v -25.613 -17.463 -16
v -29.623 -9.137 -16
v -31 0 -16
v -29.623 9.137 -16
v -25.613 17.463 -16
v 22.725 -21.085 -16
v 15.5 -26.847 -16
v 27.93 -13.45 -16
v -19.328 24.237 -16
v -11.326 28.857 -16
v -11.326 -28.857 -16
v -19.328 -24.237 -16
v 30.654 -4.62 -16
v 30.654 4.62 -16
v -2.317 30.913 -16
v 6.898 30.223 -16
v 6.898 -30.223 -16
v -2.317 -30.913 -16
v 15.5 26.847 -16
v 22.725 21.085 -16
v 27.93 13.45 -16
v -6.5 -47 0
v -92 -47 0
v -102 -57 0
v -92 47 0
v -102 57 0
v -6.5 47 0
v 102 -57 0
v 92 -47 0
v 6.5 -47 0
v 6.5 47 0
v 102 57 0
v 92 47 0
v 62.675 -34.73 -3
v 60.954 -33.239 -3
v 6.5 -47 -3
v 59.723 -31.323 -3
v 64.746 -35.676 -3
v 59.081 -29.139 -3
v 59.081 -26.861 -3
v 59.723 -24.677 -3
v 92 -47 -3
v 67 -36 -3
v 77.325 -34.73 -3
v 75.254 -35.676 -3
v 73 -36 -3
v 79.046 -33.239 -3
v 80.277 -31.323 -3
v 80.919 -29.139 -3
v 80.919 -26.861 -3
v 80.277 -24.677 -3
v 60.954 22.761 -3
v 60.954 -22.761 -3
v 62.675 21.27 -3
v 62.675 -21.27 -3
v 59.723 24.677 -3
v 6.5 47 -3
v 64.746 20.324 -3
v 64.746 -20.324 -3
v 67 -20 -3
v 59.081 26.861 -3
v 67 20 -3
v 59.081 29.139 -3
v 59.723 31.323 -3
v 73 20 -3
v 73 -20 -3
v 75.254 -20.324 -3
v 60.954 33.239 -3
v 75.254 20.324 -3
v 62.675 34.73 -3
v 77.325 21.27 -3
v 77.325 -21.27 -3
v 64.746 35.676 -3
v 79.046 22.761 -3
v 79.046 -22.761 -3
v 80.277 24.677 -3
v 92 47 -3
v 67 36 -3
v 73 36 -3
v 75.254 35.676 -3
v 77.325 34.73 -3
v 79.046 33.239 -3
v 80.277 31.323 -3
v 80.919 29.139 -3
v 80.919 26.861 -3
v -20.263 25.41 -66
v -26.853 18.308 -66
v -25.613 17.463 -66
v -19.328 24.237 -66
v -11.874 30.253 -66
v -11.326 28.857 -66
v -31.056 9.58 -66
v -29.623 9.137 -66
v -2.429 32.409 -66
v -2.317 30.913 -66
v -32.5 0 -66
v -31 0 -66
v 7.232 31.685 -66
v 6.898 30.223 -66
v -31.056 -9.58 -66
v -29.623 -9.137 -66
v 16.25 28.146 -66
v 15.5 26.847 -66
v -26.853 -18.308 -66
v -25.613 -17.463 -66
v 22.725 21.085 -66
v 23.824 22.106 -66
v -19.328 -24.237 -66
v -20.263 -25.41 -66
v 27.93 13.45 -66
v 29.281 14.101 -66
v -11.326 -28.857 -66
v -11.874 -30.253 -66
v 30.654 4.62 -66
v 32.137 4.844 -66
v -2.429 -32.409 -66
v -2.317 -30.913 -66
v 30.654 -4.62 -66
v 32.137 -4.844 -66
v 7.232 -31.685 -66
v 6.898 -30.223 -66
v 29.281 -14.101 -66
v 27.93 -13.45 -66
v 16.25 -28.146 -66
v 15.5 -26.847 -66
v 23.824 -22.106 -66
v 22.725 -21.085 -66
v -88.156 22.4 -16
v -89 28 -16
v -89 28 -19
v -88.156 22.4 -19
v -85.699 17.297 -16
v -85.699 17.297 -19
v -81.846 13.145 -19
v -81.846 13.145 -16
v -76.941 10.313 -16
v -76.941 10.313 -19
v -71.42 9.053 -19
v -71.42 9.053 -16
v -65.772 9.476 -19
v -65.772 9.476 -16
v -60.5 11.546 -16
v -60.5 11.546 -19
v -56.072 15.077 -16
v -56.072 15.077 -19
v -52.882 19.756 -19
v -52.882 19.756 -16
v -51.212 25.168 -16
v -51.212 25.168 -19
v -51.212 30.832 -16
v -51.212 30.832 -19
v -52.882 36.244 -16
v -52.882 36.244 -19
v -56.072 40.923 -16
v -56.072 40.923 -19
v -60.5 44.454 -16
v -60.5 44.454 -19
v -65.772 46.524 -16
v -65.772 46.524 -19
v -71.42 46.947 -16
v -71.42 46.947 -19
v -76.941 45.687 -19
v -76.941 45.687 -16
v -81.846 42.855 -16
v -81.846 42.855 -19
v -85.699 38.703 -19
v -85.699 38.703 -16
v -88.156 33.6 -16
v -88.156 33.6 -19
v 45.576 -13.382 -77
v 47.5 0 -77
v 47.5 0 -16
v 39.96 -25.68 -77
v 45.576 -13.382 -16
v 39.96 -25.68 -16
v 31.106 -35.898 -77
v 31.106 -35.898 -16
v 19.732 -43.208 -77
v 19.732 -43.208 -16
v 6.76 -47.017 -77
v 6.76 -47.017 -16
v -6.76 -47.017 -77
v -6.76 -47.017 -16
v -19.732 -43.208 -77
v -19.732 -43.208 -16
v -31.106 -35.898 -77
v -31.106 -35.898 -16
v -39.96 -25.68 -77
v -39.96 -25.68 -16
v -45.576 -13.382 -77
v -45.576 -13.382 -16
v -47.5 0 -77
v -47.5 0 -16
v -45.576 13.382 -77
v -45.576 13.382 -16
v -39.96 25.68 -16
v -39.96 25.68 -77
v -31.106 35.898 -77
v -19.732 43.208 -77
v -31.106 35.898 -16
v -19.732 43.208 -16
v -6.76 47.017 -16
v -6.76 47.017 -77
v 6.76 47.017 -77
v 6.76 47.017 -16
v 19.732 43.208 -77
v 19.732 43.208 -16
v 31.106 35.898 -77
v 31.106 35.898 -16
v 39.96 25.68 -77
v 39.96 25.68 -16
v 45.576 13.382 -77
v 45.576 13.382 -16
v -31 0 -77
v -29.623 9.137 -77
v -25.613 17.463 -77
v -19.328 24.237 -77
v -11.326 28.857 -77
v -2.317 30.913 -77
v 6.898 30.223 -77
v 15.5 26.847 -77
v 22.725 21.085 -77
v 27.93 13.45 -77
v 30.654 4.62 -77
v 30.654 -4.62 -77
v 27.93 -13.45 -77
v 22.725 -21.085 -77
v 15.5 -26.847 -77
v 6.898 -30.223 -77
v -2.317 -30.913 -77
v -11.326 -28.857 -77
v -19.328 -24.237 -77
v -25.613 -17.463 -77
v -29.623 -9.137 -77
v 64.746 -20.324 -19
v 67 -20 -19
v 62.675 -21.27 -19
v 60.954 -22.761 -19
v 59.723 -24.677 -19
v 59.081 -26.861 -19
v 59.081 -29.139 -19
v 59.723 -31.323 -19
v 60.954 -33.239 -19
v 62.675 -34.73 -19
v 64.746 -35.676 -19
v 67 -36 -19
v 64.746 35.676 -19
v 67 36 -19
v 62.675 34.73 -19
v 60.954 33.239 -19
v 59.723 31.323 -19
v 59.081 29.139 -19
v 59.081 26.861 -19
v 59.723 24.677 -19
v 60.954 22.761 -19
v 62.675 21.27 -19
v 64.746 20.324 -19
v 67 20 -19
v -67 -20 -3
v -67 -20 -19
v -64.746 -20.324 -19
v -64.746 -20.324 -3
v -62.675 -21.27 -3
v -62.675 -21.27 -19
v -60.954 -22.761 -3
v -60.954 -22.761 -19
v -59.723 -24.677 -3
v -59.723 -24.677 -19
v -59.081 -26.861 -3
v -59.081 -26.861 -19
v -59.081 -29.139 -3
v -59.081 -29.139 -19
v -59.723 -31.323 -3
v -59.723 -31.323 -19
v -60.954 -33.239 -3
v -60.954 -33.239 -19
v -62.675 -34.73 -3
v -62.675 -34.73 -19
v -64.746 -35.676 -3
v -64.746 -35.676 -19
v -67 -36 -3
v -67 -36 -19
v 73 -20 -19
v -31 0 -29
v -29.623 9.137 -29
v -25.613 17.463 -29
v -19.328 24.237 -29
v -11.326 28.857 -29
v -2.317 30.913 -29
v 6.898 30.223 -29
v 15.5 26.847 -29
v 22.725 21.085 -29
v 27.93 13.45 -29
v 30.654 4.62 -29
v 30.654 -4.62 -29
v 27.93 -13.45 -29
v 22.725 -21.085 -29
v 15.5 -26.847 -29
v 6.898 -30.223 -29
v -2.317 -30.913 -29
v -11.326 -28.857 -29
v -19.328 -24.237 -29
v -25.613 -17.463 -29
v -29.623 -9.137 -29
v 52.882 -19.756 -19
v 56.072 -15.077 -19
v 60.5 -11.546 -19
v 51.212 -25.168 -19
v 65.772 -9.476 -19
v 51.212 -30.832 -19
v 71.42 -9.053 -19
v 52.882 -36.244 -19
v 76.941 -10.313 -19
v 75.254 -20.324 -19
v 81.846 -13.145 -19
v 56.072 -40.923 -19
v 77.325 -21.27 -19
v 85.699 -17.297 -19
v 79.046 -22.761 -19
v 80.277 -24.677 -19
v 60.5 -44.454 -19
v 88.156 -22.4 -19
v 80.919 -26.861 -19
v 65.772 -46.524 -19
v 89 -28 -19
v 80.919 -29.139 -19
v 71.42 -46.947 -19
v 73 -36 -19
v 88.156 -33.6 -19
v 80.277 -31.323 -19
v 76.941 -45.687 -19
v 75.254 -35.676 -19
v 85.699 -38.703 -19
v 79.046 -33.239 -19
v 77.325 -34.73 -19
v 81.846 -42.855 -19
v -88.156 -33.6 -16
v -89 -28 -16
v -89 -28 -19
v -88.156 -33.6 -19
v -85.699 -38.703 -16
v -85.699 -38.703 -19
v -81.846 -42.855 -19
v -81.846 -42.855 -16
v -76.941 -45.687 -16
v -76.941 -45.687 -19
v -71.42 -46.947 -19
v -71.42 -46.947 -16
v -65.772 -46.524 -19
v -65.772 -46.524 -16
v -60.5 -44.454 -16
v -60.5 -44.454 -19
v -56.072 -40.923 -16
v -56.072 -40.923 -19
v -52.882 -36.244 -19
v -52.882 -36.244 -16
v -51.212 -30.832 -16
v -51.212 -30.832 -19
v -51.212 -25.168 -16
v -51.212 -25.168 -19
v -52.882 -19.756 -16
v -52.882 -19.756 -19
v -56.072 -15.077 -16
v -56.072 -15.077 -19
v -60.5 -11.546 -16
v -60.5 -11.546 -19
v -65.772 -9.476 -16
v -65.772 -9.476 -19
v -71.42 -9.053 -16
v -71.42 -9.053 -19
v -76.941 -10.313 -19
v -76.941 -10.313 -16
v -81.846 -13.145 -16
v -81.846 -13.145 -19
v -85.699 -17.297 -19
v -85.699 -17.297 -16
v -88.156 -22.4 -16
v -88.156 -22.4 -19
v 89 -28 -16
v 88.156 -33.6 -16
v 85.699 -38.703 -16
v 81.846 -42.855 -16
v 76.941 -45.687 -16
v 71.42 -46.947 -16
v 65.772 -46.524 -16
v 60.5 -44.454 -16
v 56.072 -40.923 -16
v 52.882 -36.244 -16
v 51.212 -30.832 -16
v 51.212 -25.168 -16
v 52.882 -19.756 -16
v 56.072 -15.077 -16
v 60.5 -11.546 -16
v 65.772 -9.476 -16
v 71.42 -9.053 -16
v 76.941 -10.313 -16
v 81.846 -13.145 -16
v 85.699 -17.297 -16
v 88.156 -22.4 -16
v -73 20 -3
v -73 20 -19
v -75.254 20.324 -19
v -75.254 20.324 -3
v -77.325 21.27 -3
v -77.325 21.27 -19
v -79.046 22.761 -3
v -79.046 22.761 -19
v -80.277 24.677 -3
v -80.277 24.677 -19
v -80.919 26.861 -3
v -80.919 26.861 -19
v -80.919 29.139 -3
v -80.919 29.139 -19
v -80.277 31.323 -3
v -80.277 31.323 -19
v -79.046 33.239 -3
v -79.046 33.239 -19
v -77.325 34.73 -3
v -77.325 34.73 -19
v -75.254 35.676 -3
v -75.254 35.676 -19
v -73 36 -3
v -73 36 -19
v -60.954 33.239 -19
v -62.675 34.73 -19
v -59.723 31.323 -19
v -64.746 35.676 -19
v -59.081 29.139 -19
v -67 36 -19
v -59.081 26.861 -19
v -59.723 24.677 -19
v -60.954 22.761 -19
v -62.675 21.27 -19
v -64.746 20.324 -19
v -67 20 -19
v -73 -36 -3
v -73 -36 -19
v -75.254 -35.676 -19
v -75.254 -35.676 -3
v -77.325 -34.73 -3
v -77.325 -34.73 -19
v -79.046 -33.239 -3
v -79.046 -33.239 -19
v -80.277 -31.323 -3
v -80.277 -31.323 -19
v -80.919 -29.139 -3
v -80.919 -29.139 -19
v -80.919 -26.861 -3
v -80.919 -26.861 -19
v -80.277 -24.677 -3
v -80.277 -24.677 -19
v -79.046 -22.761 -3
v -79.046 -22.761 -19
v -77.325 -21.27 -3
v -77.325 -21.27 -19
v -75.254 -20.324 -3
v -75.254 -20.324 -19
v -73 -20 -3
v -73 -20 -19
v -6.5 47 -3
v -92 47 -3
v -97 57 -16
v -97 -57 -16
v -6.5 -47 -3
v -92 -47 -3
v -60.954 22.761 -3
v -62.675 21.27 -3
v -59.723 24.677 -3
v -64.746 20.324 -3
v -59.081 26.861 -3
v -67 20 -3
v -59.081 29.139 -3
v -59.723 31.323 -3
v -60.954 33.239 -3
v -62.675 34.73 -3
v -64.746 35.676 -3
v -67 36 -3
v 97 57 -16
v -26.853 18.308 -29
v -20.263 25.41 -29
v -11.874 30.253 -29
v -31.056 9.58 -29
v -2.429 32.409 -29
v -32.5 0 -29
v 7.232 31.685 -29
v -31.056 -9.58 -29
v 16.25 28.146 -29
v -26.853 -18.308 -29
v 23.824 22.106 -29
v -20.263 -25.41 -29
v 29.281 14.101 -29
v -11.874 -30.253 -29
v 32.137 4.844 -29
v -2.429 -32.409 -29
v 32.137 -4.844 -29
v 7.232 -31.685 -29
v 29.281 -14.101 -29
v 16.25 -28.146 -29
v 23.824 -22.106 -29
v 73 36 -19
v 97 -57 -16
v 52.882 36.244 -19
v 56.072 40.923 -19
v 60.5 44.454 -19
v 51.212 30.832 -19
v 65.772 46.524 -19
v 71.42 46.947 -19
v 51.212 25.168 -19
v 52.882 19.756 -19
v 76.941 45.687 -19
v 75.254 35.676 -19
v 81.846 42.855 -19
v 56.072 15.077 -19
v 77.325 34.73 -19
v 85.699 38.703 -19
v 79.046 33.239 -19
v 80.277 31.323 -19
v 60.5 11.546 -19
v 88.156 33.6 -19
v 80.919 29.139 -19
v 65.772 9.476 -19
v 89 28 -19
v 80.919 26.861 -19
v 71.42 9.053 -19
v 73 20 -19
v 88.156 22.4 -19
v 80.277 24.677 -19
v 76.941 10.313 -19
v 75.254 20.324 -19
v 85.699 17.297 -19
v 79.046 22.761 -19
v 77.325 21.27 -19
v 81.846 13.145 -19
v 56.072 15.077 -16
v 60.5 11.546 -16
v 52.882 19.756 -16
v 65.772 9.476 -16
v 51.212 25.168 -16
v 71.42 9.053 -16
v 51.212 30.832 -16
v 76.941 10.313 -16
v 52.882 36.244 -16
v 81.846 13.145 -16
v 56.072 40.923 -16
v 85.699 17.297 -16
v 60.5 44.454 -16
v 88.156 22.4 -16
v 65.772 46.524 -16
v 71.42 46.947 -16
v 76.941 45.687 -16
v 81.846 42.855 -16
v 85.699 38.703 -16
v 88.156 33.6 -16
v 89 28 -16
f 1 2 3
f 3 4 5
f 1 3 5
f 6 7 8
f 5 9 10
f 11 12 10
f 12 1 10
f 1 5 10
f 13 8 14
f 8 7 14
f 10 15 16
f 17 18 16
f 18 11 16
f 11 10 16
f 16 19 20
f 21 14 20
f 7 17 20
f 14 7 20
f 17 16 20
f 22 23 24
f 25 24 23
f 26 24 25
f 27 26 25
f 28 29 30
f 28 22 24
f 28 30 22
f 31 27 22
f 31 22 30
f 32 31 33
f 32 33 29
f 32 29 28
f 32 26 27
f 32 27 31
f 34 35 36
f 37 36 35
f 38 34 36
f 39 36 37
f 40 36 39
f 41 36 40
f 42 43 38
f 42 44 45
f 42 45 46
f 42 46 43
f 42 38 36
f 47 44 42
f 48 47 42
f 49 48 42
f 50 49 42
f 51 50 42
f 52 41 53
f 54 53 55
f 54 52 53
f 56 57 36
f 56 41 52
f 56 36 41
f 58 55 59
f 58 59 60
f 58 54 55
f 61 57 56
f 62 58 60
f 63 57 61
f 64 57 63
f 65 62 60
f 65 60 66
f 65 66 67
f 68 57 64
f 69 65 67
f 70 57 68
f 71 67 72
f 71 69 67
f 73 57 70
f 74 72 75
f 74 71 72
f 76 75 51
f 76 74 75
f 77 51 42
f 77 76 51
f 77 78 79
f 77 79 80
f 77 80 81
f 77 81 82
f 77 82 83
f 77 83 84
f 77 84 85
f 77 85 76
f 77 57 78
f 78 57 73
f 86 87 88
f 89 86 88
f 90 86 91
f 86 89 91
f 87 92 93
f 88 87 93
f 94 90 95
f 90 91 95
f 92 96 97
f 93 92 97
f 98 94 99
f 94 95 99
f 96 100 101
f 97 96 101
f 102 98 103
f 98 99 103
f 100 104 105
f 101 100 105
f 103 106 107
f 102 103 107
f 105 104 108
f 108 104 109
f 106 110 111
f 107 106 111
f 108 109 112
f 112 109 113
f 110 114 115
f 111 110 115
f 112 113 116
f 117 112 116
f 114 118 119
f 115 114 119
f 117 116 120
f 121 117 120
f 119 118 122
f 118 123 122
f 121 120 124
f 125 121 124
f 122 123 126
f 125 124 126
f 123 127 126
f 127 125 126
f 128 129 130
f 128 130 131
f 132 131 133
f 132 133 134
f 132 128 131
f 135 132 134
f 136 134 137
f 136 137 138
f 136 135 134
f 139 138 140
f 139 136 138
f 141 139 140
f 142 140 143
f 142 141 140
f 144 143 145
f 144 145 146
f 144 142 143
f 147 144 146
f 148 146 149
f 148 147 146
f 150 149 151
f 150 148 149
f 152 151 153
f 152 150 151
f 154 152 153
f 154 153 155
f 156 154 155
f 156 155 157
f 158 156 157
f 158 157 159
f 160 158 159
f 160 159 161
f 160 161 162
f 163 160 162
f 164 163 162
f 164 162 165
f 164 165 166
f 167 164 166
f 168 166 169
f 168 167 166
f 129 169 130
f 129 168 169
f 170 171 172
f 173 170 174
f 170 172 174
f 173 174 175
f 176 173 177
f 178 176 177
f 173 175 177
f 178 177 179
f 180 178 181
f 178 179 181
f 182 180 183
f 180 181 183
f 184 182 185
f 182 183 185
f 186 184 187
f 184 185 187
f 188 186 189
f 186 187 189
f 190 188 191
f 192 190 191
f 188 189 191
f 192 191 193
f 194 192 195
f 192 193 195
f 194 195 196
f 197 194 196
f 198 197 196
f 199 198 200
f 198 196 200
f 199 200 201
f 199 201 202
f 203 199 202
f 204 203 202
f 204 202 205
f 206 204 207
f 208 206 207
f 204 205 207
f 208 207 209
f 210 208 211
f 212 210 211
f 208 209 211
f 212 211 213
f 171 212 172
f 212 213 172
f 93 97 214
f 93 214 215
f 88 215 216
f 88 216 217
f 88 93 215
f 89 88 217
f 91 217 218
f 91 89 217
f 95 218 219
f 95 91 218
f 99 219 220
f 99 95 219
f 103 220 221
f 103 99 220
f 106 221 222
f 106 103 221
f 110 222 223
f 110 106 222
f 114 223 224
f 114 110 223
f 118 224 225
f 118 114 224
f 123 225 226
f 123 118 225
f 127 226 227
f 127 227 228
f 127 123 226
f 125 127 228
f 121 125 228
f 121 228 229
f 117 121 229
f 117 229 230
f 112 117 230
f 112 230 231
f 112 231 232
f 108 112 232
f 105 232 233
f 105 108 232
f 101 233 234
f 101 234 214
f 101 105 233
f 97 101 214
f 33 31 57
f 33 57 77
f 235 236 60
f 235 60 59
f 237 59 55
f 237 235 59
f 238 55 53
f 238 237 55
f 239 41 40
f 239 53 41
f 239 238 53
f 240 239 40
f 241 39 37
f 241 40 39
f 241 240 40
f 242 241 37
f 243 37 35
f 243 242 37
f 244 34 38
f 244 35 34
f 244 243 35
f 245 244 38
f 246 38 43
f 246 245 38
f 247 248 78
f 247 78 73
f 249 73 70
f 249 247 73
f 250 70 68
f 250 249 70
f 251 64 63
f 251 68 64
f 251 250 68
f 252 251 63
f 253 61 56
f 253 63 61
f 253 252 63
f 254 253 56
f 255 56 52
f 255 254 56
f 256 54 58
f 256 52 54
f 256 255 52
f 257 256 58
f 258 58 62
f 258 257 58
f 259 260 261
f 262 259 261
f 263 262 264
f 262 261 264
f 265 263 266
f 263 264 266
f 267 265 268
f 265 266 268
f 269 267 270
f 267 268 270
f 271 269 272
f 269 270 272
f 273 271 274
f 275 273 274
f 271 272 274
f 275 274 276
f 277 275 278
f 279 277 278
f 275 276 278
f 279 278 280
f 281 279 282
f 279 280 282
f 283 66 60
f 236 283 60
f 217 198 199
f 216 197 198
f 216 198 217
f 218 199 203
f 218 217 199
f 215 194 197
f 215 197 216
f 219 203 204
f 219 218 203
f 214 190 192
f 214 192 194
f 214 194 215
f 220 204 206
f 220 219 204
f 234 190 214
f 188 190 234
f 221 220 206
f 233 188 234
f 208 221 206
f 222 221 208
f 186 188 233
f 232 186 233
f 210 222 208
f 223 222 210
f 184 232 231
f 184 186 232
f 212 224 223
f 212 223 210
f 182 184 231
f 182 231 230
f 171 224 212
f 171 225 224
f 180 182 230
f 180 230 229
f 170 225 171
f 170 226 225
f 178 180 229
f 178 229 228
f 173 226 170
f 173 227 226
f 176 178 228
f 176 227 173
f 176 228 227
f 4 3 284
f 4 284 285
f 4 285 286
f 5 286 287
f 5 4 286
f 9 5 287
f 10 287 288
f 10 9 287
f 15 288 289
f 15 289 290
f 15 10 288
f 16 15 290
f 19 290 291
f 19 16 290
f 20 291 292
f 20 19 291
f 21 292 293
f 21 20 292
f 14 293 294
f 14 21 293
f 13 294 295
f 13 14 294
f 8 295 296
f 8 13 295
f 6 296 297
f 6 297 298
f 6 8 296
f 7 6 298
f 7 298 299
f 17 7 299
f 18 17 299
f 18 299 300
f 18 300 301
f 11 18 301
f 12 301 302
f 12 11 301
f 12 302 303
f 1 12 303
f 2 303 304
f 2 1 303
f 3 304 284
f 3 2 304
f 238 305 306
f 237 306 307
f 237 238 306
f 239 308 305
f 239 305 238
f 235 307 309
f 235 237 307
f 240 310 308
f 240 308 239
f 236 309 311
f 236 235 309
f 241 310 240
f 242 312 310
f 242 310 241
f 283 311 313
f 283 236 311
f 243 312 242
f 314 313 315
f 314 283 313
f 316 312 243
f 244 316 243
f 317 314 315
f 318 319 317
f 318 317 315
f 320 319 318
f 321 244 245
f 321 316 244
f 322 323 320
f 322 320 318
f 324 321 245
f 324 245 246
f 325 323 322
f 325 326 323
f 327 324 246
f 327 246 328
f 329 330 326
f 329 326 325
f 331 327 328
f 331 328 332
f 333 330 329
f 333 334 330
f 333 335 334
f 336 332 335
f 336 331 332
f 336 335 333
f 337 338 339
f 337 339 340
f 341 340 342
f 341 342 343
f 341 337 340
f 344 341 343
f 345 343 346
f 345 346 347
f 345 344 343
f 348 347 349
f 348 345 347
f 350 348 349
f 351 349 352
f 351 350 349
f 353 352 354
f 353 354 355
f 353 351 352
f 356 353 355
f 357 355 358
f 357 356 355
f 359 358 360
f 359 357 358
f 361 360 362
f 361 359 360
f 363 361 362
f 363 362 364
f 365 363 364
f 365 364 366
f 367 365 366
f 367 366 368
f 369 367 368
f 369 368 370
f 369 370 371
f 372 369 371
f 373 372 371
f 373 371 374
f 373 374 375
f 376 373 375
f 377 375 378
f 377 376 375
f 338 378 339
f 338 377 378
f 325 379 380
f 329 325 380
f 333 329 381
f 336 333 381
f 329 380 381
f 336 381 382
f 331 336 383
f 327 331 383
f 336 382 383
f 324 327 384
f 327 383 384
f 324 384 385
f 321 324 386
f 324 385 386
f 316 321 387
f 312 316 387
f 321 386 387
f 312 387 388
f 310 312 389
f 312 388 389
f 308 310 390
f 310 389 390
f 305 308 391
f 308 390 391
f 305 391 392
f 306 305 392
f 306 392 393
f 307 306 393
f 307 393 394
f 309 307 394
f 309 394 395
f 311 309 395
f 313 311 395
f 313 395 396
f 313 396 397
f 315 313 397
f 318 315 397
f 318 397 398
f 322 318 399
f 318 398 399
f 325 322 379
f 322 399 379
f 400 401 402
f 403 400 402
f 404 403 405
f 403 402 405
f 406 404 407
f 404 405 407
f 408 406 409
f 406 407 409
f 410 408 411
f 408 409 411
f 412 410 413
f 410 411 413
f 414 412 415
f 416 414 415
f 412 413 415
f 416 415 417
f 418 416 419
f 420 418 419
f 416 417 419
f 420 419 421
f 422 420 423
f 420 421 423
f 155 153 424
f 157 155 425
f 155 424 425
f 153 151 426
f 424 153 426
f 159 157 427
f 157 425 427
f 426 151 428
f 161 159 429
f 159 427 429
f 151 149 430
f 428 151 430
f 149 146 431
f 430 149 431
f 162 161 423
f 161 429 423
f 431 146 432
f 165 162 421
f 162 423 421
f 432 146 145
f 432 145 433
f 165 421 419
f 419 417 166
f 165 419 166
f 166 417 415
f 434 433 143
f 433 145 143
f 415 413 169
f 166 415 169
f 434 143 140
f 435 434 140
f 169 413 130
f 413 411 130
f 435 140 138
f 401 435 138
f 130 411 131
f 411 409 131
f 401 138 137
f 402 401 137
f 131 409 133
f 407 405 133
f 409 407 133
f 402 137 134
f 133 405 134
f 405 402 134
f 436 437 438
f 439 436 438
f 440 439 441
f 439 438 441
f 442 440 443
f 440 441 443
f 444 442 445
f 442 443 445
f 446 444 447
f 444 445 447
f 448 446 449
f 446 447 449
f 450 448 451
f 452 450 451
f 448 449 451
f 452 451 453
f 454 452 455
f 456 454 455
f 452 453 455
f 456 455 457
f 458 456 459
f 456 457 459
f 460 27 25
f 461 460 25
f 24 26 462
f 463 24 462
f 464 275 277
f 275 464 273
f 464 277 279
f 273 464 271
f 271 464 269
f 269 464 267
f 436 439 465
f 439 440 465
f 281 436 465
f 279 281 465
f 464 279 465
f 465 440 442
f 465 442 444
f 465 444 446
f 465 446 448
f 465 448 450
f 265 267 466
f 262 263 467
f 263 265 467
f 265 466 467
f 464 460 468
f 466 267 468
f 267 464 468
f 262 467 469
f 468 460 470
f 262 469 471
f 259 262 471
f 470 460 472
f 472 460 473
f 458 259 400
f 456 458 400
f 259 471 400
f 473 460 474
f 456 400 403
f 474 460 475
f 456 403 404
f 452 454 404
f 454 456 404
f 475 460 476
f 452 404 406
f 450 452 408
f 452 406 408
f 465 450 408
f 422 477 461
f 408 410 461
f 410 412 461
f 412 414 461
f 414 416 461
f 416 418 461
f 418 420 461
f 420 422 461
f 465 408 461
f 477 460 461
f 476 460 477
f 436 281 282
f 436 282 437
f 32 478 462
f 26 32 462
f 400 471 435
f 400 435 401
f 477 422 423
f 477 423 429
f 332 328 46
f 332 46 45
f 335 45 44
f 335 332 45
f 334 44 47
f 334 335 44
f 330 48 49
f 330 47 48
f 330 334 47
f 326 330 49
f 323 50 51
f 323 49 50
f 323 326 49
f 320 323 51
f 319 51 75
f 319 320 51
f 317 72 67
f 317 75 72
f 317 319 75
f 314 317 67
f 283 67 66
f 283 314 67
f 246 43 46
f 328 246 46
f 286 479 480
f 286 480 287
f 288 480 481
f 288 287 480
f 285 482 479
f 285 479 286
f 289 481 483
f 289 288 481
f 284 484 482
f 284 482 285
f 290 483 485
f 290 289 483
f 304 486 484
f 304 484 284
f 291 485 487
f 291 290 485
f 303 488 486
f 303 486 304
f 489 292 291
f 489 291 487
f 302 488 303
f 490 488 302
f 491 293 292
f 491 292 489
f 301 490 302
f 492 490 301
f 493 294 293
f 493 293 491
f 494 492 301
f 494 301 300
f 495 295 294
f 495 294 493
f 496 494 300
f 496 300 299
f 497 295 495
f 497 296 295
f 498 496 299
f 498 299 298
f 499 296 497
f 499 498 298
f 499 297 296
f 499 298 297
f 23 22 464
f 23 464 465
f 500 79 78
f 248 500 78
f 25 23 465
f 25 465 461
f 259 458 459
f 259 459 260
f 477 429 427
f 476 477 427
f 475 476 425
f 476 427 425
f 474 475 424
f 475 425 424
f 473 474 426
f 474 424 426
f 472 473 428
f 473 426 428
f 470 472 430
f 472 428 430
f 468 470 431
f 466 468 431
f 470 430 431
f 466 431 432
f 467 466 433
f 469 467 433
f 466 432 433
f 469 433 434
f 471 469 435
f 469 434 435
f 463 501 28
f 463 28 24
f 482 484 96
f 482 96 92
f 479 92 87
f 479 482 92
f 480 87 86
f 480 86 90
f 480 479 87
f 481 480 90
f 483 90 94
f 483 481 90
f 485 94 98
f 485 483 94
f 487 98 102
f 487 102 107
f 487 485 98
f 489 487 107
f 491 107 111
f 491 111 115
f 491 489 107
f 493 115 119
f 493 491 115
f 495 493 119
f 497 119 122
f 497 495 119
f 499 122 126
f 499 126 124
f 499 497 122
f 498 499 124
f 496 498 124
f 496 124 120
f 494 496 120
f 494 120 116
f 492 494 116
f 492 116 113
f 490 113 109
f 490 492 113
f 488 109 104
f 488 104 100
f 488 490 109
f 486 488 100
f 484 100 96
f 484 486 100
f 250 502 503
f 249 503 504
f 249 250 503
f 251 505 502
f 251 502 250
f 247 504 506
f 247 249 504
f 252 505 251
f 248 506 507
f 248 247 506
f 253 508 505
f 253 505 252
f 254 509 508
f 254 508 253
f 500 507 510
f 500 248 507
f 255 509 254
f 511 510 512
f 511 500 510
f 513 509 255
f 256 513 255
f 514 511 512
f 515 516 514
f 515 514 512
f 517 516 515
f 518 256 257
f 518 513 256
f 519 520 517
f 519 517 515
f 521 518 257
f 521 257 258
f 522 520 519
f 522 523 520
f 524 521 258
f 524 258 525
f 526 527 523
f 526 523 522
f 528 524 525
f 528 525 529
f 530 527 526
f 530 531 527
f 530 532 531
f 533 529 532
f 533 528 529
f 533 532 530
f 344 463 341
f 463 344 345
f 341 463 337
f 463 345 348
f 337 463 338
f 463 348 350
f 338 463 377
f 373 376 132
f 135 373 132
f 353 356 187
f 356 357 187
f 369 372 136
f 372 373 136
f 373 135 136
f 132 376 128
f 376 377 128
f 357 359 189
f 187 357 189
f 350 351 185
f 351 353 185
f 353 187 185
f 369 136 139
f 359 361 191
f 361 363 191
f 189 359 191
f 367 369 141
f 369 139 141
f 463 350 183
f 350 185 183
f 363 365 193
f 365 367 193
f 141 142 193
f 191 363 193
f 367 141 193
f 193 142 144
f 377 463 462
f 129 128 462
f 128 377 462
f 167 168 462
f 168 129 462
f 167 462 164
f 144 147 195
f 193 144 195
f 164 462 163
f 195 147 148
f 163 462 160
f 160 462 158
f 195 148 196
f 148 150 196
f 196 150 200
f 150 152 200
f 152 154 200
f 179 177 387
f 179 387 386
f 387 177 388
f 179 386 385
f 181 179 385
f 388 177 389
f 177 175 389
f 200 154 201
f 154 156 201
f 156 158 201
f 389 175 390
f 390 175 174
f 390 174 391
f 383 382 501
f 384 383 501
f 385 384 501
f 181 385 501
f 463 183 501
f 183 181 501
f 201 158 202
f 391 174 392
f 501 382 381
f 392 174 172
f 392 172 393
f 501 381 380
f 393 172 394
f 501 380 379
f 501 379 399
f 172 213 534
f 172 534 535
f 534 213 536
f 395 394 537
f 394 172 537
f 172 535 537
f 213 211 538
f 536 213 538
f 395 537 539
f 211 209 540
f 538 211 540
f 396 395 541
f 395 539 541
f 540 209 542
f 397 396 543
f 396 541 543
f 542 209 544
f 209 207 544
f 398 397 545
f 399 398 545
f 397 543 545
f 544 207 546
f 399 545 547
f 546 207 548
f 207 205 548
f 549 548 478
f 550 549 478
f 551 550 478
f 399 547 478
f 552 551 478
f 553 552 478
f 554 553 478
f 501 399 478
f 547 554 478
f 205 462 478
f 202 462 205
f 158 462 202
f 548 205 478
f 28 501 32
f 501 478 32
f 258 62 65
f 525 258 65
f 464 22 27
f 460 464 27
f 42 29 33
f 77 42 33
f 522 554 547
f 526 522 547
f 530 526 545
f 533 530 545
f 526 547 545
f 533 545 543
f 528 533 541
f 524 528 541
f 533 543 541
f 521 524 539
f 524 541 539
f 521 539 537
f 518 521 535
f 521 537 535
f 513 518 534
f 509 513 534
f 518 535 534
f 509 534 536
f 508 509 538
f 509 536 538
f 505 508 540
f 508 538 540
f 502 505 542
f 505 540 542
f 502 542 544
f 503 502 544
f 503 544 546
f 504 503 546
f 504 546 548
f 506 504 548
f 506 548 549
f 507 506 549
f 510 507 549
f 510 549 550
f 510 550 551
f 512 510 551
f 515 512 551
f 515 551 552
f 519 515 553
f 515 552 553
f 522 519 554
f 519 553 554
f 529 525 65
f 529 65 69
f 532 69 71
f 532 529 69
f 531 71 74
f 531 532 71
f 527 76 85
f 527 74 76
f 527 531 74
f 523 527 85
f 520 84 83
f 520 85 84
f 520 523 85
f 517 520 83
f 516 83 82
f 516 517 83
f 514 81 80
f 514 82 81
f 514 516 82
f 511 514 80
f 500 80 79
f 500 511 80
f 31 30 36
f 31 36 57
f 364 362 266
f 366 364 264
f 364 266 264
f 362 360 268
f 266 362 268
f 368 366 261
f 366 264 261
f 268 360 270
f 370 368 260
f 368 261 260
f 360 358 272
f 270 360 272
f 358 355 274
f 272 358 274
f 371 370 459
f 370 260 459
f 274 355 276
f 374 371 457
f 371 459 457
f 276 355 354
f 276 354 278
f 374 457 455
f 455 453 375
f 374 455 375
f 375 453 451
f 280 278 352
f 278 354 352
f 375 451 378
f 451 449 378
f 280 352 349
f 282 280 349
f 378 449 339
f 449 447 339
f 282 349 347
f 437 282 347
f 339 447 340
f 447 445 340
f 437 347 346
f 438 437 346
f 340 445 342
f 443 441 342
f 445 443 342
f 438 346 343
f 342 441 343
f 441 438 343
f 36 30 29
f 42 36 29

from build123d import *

# Parameters (mm, degrees)
BOSS_EXTRUDE1_DEPTH = 57
SKETCH3_R           = 47.5
SKETCH3_R_2         = 31
BOSS_EXTRUDE3_DEPTH = 13
SKETCH4_R           = 47.5
SKETCH4_R_2         = 32.5
BOSS_EXTRUDE4_DEPTH = 37
SKETCH5_R           = 47.5
SKETCH5_R_2         = 31
BOSS_EXTRUDE5_DEPTH = 11
SKETCH8_R           = 19
BOSS_EXTRUDE6_DEPTH = 3
SKETCH9_W           = 85.5
SKETCH9_H           = 94
CUT_EXTRUDE1_DEPTH  = 3
CUT_EXTRUDE3_DEPTH  = 29.5
CUT_EXTRUDE4_DEPTH  = 36


with BuildPart() as part:
    # Sketch1 → Boss-Extrude1 (new body, symmetric)
    with BuildSketch(Plane(origin=(0, 0, 0), x_dir=(1, 0, 0), z_dir=(0, 1, 0))):
        Polygon((-102, 0), (-97, 16), (97, 16), (102, 0), (0, 0), align=None)
    extrude(amount=BOSS_EXTRUDE1_DEPTH, both=True)

    # Sketch3 → Boss-Extrude3 (add)
    with BuildSketch(Plane(origin=(0, 0, -16), x_dir=(-1, 0, 0), z_dir=(0, 0, -1))):
        with Locations(Location((0, 0, 0), (0, 0, 180))):  # turned: the seam where the file's is
            Circle(SKETCH3_R)
        Circle(SKETCH3_R_2, mode=Mode.SUBTRACT)
    extrude(amount=BOSS_EXTRUDE3_DEPTH)

    # Sketch4 → Boss-Extrude4 (add)
    with BuildSketch(Plane(origin=(0, 0, -29), x_dir=(-1, 0, 0), z_dir=(0, 0, -1))):
        with Locations(Location((0, 0, 0), (0, 0, 180))):  # turned: the seam where the file's is
            Circle(SKETCH4_R)
        Circle(SKETCH4_R_2, mode=Mode.SUBTRACT)
    extrude(amount=BOSS_EXTRUDE4_DEPTH)

    # Sketch5 → Boss-Extrude5 (add)
    with BuildSketch(Plane(origin=(0, 0, -66), x_dir=(-1, 0, 0), z_dir=(0, 0, -1))):
        with Locations(Location((0, 0, 0), (0, 0, 180))):  # turned: the seam where the file's is
            Circle(SKETCH5_R)
        Circle(SKETCH5_R_2, mode=Mode.SUBTRACT)
    extrude(amount=BOSS_EXTRUDE5_DEPTH)

    # Sketch8 → Boss-Extrude6 (add)
    with BuildSketch(Plane(origin=(0, 0, -16), x_dir=(-1, 0, 0), z_dir=(0, 0, -1))):
        with Locations(Location((-70, 28, 0), (0, 0, 180))):  # turned: the seam where the file's is
            Circle(SKETCH8_R)
        with Locations(Location((-70, -28, 0), (0, 0, 180))):  # turned: the seam where the file's is
            Circle(SKETCH8_R)
    boss_extrude6 = extrude(amount=BOSS_EXTRUDE6_DEPTH)

    # Sketch9 → Cut-Extrude1 (cut)
    with BuildSketch(Plane.XY):
        with Locations((49.25, 0)):
            Rectangle(SKETCH9_W, SKETCH9_H)
    cut_extrude1 = extrude(amount=-CUT_EXTRUDE1_DEPTH, mode=Mode.SUBTRACT)

    # Sketch6 → Cut-Extrude3 (cut, symmetric)
    with BuildSketch(Plane(origin=(0, 0, -16), x_dir=(-1, 0, 0), z_dir=(0, 0, -1))):
        with BuildLine():
            Line((-73, 36), (-67, 36))
            ThreePointArc((-67, 36), (-59, 28), (-67, 20))
            Line((-67, 20), (-73, 20))
            ThreePointArc((-73, 20), (-81, 28), (-73, 36))
        make_face()
    cut_extrude3 = extrude(amount=CUT_EXTRUDE3_DEPTH, both=True, mode=Mode.SUBTRACT)

    # Sketch7 → Cut-Extrude4 (cut, symmetric)
    with BuildSketch(Plane(origin=(0, 0, -16), x_dir=(-1, 0, 0), z_dir=(0, 0, -1))):
        with BuildLine():
            Line((-73, -20), (-67, -20))
            ThreePointArc((-67, -20), (-59, -28), (-67, -36))
            Line((-67, -36), (-73, -36))
            ThreePointArc((-73, -36), (-81, -28), (-73, -20))
        make_face()
    cut_extrude4 = extrude(amount=CUT_EXTRUDE4_DEPTH, both=True, mode=Mode.SUBTRACT)

    # Mirror1: Boss-Extrude6, Cut-Extrude1, Cut-Extrude3, Cut-Extrude4 across plane
    add(boss_extrude6.mirror(Plane(origin=(0, 0, 0), x_dir=(0, 0, 1), z_dir=(1, 0, 0))))
    add(cut_extrude1.mirror(Plane(origin=(0, 0, 0), x_dir=(0, 0, 1), z_dir=(1, 0, 0))), mode=Mode.SUBTRACT)
    add(cut_extrude3.mirror(Plane(origin=(0, 0, 0), x_dir=(0, 0, 1), z_dir=(1, 0, 0))), mode=Mode.SUBTRACT)
    add(cut_extrude4.mirror(Plane(origin=(0, 0, 0), x_dir=(0, 0, 1), z_dir=(1, 0, 0))), mode=Mode.SUBTRACT)


solid = part.part
